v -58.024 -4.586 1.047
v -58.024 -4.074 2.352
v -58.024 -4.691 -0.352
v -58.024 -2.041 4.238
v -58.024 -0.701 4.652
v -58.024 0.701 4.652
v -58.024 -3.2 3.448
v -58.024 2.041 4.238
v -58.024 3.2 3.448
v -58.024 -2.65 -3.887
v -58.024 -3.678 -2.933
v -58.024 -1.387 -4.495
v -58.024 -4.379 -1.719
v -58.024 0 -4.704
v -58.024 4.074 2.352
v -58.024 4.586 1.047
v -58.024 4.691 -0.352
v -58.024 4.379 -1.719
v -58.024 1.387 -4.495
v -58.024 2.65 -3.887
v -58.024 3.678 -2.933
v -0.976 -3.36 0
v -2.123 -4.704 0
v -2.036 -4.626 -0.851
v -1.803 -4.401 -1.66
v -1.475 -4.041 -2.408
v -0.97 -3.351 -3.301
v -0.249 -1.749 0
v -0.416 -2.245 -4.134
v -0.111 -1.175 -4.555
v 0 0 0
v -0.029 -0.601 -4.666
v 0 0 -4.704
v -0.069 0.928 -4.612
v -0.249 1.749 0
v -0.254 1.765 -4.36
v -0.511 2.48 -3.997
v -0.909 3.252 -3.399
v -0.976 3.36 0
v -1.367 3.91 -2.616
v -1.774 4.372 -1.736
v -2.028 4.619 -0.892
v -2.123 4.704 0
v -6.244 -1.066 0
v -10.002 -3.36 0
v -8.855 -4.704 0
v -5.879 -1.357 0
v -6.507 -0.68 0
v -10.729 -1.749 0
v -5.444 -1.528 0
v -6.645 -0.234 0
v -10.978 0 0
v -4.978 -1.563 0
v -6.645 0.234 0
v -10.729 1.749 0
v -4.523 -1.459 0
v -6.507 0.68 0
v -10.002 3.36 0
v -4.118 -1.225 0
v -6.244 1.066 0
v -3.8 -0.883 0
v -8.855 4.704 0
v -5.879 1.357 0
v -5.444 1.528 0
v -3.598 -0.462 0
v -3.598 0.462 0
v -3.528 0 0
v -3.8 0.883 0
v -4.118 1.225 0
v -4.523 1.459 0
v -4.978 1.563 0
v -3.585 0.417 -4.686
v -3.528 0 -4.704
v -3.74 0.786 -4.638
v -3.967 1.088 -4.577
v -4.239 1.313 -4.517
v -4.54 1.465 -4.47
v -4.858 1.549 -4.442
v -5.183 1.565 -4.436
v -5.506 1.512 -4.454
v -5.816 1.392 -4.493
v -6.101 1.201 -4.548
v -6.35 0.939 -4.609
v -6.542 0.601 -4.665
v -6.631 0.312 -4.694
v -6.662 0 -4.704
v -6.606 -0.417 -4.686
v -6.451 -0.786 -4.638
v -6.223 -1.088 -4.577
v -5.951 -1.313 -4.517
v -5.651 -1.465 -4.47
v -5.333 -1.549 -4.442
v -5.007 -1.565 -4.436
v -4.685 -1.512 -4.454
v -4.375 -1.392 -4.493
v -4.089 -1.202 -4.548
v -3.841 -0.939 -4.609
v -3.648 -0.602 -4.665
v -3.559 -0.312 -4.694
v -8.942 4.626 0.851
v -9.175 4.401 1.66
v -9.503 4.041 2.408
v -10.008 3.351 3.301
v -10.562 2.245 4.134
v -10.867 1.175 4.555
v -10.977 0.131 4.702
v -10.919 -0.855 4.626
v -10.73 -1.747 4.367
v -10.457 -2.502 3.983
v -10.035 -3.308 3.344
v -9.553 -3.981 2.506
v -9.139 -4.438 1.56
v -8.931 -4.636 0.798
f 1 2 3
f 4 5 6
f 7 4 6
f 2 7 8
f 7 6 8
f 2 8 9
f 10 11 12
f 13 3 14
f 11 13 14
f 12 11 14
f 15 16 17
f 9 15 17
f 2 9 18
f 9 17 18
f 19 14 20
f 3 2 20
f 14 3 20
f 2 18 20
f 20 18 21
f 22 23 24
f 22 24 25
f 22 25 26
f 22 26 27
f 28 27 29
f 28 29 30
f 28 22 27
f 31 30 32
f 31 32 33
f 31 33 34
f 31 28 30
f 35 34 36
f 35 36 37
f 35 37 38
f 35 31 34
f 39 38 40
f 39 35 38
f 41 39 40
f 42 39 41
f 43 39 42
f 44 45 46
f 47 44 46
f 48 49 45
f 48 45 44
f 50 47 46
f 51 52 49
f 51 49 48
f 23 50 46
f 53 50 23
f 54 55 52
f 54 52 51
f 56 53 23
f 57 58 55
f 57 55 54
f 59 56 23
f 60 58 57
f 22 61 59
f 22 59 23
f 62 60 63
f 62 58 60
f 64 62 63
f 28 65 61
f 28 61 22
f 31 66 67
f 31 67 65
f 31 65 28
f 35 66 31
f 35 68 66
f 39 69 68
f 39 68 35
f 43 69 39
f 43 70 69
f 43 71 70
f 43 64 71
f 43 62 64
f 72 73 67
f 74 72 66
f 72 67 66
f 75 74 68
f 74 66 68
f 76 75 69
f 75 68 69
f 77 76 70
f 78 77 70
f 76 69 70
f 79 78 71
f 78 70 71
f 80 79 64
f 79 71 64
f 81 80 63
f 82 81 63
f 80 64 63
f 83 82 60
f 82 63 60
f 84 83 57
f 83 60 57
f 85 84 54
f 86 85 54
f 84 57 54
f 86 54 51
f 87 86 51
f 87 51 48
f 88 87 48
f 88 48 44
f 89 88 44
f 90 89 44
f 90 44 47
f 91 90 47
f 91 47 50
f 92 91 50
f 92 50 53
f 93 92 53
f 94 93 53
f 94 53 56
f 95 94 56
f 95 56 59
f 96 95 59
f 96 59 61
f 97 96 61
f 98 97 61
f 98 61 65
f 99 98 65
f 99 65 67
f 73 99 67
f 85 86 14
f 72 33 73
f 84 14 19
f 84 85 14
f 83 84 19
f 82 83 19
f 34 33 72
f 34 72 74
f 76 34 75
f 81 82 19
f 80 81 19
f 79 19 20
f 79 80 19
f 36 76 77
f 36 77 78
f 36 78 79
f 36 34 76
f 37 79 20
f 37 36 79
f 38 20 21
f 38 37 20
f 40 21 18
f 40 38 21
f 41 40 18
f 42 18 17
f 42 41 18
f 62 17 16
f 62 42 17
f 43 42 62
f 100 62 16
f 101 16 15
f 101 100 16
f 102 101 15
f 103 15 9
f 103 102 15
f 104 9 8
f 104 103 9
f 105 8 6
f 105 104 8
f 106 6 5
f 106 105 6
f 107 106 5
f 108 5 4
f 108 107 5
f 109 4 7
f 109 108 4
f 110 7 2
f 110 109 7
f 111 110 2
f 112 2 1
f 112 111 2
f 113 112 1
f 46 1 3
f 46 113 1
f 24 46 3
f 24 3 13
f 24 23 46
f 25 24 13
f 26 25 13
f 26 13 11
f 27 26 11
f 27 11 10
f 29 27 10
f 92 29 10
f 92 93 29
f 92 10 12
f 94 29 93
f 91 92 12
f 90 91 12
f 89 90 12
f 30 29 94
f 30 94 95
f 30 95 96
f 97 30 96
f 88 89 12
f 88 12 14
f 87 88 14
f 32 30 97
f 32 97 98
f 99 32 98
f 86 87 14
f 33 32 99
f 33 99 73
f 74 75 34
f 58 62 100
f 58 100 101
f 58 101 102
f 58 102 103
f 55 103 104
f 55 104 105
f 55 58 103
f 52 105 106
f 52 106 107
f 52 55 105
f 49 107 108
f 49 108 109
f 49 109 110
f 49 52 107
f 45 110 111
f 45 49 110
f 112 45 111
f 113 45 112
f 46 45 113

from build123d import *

# Parameters (mm, degrees)
SKETCH1_R               = 4.70408
BOSS_EXTRUDE1_DEPTH     = 58.02376
CUT_EXTRUDE1_DEPTH      = 5.70408
CUT_EXTRUDE1_DEPTH_BACK = 5.70408
SKETCH3_R               = 6.2738
CUT_EXTRUDE2_DEPTH      = 5.704080123
SKETCH4_R               = 1.56718
CUT_EXTRUDE3_DEPTH      = 5.7040801


with BuildPart() as part:
    # Sketch1 → Boss-Extrude1 (new body)
    with BuildSketch(Plane(origin=(0, 0, 0), x_dir=(0, 0, -1), z_dir=(1, 0, 0))):
        Circle(SKETCH1_R)
    extrude(amount=-BOSS_EXTRUDE1_DEPTH)

    # Sketch2 → Cut-Extrude1 (cut, two sides)
    with BuildSketch(Plane.XY) as cut_extrude1_sk:
        with BuildLine():
            Line((-6.2738, 6.2738), (2.931020603, 6.2738))
            Line((2.931020603, 6.2738), (2.931020603, -6.2738))
            Line((2.931020603, -6.2738), (-6.2738, -6.2738))
            ThreePointArc((-6.2738, -6.2738), (0, 0), (-6.2738, 6.2738))
        make_face()
    extrude(amount=CUT_EXTRUDE1_DEPTH, mode=Mode.SUBTRACT)
    extrude(cut_extrude1_sk.sketch, amount=-CUT_EXTRUDE1_DEPTH_BACK, mode=Mode.SUBTRACT)

    # Sketch3 → Cut-Extrude2 (cut, through all)
    with BuildSketch(Plane.XY):
        with Locations((-4.70408, 0)):
            Circle(SKETCH3_R)
    extrude(amount=CUT_EXTRUDE2_DEPTH, mode=Mode.SUBTRACT)

    # Sketch4 → Cut-Extrude3 (cut, through all)
    with BuildSketch(Plane.XY):
        with Locations((-5.09524, 0)):
            Circle(SKETCH4_R)
    extrude(amount=-CUT_EXTRUDE3_DEPTH, mode=Mode.SUBTRACT)


solid = part.part
